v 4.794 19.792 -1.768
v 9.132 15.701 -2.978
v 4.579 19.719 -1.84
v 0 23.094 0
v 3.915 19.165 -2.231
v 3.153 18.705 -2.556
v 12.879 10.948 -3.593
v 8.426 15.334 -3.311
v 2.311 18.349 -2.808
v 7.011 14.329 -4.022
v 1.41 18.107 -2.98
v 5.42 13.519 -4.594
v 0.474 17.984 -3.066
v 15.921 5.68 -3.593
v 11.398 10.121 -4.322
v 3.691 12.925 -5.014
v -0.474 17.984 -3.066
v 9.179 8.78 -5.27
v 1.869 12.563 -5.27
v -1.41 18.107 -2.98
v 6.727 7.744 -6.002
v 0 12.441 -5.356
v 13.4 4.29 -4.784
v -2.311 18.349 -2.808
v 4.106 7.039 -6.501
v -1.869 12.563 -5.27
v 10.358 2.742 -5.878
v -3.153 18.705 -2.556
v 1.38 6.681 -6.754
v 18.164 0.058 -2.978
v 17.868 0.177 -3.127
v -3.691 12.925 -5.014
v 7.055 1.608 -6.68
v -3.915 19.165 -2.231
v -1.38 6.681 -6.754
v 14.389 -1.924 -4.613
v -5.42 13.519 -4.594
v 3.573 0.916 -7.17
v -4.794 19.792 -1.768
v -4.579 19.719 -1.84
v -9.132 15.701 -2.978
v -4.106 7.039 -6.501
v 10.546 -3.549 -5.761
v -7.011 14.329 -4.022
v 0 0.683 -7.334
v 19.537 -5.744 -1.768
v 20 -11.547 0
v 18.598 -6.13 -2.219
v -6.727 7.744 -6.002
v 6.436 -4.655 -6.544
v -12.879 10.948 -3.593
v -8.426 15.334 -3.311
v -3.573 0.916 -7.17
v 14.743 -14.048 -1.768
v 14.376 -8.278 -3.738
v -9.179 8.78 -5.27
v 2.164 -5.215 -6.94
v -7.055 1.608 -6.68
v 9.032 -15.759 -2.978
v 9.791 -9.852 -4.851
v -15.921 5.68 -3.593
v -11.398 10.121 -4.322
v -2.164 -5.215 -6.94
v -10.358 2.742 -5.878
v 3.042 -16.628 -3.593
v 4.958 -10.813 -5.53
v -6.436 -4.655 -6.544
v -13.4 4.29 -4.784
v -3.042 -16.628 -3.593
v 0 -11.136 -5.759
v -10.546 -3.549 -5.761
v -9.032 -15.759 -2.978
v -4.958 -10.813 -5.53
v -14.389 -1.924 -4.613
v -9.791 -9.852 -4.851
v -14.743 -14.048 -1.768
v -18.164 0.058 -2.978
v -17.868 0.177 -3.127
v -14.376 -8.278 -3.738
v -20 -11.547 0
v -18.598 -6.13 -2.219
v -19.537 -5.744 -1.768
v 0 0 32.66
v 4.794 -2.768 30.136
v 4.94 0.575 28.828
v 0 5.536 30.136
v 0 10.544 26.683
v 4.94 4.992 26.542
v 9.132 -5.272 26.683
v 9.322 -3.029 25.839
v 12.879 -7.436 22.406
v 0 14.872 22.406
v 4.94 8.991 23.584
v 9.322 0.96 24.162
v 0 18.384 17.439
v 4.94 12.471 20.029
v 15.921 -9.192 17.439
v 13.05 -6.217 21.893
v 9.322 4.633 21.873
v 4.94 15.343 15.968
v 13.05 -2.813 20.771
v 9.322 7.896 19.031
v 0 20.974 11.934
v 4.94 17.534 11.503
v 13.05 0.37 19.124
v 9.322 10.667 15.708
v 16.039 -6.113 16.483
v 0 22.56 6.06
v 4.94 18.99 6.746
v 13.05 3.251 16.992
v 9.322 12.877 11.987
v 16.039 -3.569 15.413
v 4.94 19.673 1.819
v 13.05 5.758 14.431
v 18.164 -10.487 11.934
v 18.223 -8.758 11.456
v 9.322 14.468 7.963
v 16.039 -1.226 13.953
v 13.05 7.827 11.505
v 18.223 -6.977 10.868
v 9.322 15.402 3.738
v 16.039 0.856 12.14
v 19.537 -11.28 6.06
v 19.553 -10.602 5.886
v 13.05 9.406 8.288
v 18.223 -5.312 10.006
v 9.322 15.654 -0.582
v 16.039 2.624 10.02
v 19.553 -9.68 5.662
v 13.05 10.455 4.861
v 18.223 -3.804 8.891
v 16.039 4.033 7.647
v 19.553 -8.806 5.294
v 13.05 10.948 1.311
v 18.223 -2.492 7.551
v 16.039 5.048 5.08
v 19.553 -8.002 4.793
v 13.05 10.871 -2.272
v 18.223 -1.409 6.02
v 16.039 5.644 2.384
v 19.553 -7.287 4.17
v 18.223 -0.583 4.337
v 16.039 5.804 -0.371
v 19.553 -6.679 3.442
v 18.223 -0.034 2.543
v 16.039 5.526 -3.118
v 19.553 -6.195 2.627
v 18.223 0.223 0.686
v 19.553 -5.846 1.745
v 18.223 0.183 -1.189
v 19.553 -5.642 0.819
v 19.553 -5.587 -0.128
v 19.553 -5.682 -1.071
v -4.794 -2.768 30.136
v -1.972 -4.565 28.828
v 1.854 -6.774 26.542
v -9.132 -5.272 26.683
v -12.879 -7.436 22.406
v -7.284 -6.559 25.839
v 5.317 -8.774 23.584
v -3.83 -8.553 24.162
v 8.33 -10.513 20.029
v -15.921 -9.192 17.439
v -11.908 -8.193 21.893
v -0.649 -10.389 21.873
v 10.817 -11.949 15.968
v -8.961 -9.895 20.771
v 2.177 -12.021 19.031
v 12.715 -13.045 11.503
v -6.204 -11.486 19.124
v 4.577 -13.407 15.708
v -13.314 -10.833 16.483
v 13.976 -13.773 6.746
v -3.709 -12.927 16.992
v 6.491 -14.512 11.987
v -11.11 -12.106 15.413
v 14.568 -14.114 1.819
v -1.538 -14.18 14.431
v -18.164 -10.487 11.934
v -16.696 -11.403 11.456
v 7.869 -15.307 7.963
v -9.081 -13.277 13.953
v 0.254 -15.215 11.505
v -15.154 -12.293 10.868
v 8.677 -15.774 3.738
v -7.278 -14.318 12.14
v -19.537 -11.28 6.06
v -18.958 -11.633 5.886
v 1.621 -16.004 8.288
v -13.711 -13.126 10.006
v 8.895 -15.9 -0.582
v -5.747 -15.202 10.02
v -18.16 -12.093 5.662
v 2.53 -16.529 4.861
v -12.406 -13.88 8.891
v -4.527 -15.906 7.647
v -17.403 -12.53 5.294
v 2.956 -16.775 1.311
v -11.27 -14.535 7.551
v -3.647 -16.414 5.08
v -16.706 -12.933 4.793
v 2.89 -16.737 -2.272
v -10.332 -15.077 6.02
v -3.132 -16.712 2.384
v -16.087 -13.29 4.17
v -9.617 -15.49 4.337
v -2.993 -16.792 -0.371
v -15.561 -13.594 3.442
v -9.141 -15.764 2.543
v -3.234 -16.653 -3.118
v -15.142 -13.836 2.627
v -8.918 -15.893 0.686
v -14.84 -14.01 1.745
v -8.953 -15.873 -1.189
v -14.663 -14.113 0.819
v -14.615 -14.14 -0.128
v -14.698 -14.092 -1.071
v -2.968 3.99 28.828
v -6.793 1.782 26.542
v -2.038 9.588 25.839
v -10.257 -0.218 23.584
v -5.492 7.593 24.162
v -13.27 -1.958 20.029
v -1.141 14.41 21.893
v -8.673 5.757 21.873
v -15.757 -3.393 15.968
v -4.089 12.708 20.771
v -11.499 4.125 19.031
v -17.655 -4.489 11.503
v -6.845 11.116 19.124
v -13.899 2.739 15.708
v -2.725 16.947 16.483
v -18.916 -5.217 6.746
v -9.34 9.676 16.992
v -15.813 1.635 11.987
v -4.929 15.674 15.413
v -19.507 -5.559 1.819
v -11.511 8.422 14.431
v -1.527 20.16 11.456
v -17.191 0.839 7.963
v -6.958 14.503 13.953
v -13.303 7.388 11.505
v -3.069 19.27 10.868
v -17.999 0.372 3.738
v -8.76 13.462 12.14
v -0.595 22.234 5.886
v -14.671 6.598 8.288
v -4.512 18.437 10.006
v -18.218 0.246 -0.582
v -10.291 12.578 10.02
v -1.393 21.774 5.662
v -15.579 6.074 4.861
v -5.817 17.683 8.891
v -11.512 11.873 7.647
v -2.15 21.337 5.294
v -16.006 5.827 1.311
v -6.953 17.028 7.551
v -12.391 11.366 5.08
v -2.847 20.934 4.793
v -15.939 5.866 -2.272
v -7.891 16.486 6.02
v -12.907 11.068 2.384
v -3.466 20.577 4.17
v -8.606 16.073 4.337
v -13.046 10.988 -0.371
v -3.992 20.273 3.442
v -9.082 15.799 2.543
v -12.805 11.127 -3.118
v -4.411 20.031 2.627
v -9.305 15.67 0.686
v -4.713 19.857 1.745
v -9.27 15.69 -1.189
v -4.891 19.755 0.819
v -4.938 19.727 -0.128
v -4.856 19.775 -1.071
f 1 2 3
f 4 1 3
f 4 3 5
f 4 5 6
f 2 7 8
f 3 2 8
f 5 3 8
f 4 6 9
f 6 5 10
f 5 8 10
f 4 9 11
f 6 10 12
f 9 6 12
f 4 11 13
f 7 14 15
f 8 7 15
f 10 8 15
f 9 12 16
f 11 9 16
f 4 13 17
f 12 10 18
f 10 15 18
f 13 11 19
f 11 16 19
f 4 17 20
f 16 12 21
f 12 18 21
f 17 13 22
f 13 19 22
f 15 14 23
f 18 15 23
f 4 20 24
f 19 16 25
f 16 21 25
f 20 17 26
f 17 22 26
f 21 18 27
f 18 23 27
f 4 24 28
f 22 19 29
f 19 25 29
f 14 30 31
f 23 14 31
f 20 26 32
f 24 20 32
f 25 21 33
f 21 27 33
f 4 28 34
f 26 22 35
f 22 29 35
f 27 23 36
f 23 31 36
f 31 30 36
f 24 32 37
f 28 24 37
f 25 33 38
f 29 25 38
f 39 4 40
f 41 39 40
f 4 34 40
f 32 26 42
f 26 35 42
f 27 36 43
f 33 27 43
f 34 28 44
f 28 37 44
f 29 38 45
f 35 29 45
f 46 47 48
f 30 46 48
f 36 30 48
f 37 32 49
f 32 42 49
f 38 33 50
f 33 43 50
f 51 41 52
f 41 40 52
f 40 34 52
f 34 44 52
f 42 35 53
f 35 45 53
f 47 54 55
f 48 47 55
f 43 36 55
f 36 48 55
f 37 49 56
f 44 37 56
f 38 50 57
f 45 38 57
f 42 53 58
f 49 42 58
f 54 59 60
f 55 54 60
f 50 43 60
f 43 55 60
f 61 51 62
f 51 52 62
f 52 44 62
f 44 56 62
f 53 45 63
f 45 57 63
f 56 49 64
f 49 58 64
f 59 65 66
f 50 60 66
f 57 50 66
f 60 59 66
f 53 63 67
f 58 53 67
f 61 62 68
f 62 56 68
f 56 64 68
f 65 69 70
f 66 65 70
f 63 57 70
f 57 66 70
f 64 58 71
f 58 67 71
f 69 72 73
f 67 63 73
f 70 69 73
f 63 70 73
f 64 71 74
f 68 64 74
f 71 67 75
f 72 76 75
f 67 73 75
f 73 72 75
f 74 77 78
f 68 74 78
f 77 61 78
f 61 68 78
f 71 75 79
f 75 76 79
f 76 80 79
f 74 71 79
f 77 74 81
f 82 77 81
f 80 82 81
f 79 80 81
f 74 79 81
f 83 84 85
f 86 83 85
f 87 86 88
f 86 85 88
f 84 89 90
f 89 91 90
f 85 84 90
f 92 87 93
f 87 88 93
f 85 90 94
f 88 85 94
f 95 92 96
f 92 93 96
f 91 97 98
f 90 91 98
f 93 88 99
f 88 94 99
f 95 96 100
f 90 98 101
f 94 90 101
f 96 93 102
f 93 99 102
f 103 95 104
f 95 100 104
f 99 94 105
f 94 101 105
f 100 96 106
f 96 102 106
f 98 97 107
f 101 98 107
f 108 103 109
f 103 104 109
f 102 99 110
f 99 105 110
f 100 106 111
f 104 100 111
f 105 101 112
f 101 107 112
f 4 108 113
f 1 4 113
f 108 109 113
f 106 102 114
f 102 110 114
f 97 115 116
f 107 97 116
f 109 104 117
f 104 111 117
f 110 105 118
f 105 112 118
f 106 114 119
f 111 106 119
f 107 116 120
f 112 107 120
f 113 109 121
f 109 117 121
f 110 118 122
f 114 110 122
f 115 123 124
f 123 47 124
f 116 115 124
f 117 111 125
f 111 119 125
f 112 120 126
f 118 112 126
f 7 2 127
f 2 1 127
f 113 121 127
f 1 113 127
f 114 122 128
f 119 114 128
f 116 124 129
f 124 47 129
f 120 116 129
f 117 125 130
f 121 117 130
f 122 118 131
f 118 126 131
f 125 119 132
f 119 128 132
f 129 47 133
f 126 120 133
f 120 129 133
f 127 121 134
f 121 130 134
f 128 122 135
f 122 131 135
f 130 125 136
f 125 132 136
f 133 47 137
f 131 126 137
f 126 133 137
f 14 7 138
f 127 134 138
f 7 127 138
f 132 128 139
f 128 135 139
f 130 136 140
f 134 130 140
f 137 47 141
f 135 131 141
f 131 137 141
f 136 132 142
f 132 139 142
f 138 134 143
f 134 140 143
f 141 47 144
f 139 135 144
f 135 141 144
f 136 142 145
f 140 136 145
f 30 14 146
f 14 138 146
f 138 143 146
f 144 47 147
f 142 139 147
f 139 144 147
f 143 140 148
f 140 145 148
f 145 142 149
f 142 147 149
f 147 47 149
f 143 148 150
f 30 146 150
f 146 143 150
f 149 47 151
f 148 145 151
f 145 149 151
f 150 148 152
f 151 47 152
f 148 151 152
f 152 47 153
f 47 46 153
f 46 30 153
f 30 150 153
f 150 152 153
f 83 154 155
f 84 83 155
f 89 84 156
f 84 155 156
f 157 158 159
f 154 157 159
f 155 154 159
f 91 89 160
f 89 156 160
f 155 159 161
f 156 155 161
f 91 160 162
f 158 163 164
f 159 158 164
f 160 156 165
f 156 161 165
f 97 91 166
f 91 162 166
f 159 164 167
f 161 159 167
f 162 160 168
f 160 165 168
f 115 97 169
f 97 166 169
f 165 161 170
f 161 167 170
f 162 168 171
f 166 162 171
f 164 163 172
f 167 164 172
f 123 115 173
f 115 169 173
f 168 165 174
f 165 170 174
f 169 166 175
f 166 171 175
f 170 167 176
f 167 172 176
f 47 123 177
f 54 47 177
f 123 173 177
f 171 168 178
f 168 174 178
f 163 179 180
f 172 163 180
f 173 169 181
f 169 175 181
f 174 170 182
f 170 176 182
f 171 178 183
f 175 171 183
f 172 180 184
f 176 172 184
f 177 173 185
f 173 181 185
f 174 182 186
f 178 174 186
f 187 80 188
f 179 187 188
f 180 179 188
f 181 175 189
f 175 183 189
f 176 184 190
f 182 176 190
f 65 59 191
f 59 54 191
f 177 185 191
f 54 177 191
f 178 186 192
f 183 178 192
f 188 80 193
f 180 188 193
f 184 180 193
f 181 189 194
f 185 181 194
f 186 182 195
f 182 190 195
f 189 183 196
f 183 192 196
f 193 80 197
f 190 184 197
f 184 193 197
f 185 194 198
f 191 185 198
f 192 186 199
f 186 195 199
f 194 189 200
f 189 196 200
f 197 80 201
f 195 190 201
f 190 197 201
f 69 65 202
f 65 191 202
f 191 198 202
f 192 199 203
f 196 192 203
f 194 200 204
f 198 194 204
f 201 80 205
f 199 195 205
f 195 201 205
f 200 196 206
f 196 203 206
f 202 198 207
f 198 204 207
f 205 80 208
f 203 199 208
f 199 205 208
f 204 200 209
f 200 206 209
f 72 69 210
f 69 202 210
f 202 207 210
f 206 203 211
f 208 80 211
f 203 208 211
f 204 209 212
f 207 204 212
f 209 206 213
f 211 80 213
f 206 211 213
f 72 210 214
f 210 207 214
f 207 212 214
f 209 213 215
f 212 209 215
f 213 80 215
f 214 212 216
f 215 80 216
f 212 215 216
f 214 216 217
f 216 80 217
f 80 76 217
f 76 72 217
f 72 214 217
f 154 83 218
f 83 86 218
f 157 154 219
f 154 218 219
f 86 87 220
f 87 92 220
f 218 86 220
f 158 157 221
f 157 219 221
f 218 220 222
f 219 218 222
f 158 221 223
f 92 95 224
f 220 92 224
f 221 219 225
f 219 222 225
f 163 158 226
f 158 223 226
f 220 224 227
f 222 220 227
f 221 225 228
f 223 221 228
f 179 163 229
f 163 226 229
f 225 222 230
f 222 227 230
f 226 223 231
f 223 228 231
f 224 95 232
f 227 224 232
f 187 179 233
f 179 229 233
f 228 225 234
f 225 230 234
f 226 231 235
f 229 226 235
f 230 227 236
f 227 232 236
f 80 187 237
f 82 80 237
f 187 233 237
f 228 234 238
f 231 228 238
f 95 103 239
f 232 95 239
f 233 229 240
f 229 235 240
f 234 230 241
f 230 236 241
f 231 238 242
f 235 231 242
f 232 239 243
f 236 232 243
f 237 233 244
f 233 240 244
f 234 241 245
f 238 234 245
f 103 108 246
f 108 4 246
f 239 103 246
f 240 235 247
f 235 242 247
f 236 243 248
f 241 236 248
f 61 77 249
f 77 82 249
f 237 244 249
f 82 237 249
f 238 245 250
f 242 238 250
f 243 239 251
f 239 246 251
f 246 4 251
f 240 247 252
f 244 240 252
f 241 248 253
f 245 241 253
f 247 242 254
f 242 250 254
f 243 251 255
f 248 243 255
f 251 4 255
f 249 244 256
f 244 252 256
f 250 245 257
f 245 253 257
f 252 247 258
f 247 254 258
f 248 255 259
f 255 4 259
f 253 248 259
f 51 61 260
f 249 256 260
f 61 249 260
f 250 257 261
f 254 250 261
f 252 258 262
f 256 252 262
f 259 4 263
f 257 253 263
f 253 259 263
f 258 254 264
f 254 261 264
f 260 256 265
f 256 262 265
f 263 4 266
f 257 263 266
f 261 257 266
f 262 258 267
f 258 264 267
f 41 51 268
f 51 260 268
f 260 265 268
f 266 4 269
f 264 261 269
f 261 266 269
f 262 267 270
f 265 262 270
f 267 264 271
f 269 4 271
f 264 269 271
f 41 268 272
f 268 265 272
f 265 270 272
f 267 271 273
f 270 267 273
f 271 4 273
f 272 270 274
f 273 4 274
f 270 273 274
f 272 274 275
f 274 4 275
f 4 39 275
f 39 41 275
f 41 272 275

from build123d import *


with BuildPart() as f2:
    # F0 (on Top) → F2 (revolve)
    with BuildSketch(Plane.XY):
        with BuildLine():
            ThreePointArc((40, -46.1880215352), (54.6410161514, 8.4529946162), (0, 23.0940107676))
            Line((0, 23.0940107676), (20, -11.5470053838))
            Line((20, -11.5470053838), (40, -46.1880215352))
        make_face()
    revolve(axis=Axis((30, -28.8675134595, 0), (0.5, -0.8660254038, 0)))


with BuildPart() as f3:
    # F0 (on Top) → F3 (revolve)
    with BuildSketch(Plane.XY):
        with BuildLine():
            ThreePointArc((-60, -11.5470053838), (-20, -51.5470053838), (20, -11.5470053838))
            Line((20, -11.5470053838), (-20, -11.5470053838))
            Line((-20, -11.5470053838), (-60, -11.5470053838))
        make_face()
    revolve(axis=Axis((-40, -11.5470053838, 0), (-1, 0, 0)))


with BuildPart() as f4:
    # F0 (on Top) → F4 (revolve)
    with BuildSketch(Plane.XY):
        with BuildLine():
            Line((-20, -11.5470053838), (0, 23.0940107676))
            Line((0, 23.0940107676), (20, 57.735026919))
            ThreePointArc((20, 57.735026919), (-34.6410161514, 43.0940107676), (-20, -11.5470053838))
        make_face()
    revolve(axis=Axis((10, 40.4145188433, 0), (0.5, 0.8660254038, 0)))


with BuildPart() as f5:
    # F1 (on Right) → F5 (revolve)
    with BuildSketch(Plane.YZ):
        with BuildLine():
            Line((-23.0940107676, 65.3197264742), (0, 32.6598632371))
            Line((0, 32.6598632371), (23.0940107676, 0))
            ThreePointArc((23.0940107676, 0), (32.6598632371, 55.7538740047), (-23.0940107676, 65.3197264742))
        make_face()
    revolve(axis=Axis((0, -11.5470053838, 48.9897948557), (0, 0.5773502692, -0.8164965809)))


with BuildPart() as f2_1:
    add(f2.part)

    # F6: intersect F3, F4, F5
    add(f3.part, mode=Mode.INTERSECT)
    add(f4.part, mode=Mode.INTERSECT)
    add(f5.part, mode=Mode.INTERSECT)


solid = f2_1.part
